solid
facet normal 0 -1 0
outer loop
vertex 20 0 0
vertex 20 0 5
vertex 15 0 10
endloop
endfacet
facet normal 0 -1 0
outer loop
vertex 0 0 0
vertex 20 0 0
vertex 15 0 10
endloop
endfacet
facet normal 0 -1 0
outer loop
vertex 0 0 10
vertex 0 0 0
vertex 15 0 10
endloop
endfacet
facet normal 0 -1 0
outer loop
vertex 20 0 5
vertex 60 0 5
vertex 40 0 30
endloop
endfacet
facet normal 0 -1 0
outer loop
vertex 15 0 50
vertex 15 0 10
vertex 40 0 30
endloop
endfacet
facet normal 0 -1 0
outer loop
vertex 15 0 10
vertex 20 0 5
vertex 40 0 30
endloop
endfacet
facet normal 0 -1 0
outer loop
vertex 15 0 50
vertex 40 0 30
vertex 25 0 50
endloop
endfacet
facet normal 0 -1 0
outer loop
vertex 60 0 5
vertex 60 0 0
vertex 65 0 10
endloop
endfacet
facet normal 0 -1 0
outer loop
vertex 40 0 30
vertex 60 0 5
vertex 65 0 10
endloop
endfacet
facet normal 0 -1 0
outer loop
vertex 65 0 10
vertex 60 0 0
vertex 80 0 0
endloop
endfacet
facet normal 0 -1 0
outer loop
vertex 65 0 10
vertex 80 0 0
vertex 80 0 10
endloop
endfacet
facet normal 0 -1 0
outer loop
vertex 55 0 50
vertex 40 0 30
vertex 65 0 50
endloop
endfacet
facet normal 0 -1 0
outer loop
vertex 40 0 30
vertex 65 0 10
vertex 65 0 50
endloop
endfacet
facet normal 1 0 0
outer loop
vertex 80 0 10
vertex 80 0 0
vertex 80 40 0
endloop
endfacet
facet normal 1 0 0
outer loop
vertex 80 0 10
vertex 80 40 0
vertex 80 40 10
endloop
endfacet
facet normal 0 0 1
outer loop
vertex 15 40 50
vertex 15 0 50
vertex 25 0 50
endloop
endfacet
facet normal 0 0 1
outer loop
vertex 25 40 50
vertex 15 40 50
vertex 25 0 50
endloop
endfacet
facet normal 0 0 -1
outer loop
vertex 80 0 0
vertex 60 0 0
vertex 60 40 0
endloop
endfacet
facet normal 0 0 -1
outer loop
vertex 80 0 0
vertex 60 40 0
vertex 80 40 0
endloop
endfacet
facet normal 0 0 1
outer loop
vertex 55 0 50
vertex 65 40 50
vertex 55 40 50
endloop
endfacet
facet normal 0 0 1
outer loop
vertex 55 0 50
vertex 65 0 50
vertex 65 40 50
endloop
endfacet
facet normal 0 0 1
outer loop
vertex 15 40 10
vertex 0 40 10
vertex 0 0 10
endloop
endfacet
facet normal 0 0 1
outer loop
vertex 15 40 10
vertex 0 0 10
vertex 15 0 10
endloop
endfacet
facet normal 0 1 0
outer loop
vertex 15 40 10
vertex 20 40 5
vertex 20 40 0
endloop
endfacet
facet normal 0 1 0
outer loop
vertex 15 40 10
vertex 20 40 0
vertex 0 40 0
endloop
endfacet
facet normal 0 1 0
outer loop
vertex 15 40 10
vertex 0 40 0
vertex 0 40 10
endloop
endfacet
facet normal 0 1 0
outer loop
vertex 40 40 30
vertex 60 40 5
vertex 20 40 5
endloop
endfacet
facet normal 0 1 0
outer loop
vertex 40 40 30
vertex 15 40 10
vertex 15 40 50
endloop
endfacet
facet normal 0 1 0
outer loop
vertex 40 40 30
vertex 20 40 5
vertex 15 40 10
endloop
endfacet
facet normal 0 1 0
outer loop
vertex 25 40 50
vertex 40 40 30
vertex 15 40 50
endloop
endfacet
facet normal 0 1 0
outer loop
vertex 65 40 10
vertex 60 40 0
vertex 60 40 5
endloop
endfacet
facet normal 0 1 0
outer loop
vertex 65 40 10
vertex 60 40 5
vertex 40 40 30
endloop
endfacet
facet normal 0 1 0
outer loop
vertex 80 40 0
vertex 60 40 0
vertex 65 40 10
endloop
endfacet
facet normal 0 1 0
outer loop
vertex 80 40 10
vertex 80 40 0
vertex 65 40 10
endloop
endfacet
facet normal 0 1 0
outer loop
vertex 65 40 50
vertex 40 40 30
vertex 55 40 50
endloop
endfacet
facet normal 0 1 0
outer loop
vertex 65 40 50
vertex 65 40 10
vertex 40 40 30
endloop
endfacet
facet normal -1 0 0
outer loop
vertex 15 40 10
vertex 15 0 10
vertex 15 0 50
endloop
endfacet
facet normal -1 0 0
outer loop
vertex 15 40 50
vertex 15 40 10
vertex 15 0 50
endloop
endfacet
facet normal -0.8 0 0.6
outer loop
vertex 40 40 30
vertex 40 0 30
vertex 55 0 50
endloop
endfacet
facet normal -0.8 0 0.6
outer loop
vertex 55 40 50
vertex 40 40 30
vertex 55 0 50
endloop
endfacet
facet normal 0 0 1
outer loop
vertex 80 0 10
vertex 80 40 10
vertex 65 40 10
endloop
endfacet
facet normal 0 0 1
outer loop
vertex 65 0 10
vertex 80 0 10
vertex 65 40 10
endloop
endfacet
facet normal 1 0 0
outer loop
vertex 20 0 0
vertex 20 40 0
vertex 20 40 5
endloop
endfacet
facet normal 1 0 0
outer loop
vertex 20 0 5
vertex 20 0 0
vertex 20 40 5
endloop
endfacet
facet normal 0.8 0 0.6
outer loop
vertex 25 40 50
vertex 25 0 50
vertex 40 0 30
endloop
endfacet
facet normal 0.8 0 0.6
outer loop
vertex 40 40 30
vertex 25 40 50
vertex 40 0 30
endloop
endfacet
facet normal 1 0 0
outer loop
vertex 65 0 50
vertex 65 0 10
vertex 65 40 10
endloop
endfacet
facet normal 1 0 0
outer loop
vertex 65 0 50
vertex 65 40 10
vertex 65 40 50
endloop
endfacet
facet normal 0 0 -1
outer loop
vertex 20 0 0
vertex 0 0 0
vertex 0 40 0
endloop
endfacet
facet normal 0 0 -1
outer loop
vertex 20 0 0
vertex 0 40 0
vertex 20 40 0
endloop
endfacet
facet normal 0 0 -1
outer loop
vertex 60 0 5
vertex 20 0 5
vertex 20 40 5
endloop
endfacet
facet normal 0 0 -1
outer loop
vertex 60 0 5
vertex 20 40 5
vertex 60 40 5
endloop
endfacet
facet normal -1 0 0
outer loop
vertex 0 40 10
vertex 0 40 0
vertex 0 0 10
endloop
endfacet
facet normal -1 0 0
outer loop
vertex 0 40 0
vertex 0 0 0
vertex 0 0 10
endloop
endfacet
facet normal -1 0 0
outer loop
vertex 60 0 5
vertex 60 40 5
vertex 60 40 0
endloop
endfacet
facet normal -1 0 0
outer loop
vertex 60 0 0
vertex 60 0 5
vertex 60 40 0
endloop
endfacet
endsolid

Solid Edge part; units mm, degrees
sketch "Sketch1" plane through (0, 0, 0) normal (0, -1, 0) x (1, 0, 0)
  line L0 (15, 50) -> (25, 50)
  line L1 (25, 50) -> (40, 30)
  line L2 (40, 30) -> (55, 50)
  line L3 (65, 50) -> (55, 50)
  line L4 (65, 10) -> (65, 50)
  line L5 (80, 10) -> (65, 10)
  line L6 (80, 0) -> (80, 10)
  line L7 (60, 0) -> (80, 0)
  line L8 (60, 5) -> (60, 0)
  line L9 (20, 5) -> (60, 5)
  line L10 (20, 0) -> (20, 5)
  line L11 (0, 0) -> (20, 0)
  line L12 (0, 0) -> (0, 10)
  line L13 (0, 10) -> (15, 10)
  line L14 (15, 10) -> (15, 50)
extrude "Protrusion1" add sketch "Sketch1" against normal blind 40
